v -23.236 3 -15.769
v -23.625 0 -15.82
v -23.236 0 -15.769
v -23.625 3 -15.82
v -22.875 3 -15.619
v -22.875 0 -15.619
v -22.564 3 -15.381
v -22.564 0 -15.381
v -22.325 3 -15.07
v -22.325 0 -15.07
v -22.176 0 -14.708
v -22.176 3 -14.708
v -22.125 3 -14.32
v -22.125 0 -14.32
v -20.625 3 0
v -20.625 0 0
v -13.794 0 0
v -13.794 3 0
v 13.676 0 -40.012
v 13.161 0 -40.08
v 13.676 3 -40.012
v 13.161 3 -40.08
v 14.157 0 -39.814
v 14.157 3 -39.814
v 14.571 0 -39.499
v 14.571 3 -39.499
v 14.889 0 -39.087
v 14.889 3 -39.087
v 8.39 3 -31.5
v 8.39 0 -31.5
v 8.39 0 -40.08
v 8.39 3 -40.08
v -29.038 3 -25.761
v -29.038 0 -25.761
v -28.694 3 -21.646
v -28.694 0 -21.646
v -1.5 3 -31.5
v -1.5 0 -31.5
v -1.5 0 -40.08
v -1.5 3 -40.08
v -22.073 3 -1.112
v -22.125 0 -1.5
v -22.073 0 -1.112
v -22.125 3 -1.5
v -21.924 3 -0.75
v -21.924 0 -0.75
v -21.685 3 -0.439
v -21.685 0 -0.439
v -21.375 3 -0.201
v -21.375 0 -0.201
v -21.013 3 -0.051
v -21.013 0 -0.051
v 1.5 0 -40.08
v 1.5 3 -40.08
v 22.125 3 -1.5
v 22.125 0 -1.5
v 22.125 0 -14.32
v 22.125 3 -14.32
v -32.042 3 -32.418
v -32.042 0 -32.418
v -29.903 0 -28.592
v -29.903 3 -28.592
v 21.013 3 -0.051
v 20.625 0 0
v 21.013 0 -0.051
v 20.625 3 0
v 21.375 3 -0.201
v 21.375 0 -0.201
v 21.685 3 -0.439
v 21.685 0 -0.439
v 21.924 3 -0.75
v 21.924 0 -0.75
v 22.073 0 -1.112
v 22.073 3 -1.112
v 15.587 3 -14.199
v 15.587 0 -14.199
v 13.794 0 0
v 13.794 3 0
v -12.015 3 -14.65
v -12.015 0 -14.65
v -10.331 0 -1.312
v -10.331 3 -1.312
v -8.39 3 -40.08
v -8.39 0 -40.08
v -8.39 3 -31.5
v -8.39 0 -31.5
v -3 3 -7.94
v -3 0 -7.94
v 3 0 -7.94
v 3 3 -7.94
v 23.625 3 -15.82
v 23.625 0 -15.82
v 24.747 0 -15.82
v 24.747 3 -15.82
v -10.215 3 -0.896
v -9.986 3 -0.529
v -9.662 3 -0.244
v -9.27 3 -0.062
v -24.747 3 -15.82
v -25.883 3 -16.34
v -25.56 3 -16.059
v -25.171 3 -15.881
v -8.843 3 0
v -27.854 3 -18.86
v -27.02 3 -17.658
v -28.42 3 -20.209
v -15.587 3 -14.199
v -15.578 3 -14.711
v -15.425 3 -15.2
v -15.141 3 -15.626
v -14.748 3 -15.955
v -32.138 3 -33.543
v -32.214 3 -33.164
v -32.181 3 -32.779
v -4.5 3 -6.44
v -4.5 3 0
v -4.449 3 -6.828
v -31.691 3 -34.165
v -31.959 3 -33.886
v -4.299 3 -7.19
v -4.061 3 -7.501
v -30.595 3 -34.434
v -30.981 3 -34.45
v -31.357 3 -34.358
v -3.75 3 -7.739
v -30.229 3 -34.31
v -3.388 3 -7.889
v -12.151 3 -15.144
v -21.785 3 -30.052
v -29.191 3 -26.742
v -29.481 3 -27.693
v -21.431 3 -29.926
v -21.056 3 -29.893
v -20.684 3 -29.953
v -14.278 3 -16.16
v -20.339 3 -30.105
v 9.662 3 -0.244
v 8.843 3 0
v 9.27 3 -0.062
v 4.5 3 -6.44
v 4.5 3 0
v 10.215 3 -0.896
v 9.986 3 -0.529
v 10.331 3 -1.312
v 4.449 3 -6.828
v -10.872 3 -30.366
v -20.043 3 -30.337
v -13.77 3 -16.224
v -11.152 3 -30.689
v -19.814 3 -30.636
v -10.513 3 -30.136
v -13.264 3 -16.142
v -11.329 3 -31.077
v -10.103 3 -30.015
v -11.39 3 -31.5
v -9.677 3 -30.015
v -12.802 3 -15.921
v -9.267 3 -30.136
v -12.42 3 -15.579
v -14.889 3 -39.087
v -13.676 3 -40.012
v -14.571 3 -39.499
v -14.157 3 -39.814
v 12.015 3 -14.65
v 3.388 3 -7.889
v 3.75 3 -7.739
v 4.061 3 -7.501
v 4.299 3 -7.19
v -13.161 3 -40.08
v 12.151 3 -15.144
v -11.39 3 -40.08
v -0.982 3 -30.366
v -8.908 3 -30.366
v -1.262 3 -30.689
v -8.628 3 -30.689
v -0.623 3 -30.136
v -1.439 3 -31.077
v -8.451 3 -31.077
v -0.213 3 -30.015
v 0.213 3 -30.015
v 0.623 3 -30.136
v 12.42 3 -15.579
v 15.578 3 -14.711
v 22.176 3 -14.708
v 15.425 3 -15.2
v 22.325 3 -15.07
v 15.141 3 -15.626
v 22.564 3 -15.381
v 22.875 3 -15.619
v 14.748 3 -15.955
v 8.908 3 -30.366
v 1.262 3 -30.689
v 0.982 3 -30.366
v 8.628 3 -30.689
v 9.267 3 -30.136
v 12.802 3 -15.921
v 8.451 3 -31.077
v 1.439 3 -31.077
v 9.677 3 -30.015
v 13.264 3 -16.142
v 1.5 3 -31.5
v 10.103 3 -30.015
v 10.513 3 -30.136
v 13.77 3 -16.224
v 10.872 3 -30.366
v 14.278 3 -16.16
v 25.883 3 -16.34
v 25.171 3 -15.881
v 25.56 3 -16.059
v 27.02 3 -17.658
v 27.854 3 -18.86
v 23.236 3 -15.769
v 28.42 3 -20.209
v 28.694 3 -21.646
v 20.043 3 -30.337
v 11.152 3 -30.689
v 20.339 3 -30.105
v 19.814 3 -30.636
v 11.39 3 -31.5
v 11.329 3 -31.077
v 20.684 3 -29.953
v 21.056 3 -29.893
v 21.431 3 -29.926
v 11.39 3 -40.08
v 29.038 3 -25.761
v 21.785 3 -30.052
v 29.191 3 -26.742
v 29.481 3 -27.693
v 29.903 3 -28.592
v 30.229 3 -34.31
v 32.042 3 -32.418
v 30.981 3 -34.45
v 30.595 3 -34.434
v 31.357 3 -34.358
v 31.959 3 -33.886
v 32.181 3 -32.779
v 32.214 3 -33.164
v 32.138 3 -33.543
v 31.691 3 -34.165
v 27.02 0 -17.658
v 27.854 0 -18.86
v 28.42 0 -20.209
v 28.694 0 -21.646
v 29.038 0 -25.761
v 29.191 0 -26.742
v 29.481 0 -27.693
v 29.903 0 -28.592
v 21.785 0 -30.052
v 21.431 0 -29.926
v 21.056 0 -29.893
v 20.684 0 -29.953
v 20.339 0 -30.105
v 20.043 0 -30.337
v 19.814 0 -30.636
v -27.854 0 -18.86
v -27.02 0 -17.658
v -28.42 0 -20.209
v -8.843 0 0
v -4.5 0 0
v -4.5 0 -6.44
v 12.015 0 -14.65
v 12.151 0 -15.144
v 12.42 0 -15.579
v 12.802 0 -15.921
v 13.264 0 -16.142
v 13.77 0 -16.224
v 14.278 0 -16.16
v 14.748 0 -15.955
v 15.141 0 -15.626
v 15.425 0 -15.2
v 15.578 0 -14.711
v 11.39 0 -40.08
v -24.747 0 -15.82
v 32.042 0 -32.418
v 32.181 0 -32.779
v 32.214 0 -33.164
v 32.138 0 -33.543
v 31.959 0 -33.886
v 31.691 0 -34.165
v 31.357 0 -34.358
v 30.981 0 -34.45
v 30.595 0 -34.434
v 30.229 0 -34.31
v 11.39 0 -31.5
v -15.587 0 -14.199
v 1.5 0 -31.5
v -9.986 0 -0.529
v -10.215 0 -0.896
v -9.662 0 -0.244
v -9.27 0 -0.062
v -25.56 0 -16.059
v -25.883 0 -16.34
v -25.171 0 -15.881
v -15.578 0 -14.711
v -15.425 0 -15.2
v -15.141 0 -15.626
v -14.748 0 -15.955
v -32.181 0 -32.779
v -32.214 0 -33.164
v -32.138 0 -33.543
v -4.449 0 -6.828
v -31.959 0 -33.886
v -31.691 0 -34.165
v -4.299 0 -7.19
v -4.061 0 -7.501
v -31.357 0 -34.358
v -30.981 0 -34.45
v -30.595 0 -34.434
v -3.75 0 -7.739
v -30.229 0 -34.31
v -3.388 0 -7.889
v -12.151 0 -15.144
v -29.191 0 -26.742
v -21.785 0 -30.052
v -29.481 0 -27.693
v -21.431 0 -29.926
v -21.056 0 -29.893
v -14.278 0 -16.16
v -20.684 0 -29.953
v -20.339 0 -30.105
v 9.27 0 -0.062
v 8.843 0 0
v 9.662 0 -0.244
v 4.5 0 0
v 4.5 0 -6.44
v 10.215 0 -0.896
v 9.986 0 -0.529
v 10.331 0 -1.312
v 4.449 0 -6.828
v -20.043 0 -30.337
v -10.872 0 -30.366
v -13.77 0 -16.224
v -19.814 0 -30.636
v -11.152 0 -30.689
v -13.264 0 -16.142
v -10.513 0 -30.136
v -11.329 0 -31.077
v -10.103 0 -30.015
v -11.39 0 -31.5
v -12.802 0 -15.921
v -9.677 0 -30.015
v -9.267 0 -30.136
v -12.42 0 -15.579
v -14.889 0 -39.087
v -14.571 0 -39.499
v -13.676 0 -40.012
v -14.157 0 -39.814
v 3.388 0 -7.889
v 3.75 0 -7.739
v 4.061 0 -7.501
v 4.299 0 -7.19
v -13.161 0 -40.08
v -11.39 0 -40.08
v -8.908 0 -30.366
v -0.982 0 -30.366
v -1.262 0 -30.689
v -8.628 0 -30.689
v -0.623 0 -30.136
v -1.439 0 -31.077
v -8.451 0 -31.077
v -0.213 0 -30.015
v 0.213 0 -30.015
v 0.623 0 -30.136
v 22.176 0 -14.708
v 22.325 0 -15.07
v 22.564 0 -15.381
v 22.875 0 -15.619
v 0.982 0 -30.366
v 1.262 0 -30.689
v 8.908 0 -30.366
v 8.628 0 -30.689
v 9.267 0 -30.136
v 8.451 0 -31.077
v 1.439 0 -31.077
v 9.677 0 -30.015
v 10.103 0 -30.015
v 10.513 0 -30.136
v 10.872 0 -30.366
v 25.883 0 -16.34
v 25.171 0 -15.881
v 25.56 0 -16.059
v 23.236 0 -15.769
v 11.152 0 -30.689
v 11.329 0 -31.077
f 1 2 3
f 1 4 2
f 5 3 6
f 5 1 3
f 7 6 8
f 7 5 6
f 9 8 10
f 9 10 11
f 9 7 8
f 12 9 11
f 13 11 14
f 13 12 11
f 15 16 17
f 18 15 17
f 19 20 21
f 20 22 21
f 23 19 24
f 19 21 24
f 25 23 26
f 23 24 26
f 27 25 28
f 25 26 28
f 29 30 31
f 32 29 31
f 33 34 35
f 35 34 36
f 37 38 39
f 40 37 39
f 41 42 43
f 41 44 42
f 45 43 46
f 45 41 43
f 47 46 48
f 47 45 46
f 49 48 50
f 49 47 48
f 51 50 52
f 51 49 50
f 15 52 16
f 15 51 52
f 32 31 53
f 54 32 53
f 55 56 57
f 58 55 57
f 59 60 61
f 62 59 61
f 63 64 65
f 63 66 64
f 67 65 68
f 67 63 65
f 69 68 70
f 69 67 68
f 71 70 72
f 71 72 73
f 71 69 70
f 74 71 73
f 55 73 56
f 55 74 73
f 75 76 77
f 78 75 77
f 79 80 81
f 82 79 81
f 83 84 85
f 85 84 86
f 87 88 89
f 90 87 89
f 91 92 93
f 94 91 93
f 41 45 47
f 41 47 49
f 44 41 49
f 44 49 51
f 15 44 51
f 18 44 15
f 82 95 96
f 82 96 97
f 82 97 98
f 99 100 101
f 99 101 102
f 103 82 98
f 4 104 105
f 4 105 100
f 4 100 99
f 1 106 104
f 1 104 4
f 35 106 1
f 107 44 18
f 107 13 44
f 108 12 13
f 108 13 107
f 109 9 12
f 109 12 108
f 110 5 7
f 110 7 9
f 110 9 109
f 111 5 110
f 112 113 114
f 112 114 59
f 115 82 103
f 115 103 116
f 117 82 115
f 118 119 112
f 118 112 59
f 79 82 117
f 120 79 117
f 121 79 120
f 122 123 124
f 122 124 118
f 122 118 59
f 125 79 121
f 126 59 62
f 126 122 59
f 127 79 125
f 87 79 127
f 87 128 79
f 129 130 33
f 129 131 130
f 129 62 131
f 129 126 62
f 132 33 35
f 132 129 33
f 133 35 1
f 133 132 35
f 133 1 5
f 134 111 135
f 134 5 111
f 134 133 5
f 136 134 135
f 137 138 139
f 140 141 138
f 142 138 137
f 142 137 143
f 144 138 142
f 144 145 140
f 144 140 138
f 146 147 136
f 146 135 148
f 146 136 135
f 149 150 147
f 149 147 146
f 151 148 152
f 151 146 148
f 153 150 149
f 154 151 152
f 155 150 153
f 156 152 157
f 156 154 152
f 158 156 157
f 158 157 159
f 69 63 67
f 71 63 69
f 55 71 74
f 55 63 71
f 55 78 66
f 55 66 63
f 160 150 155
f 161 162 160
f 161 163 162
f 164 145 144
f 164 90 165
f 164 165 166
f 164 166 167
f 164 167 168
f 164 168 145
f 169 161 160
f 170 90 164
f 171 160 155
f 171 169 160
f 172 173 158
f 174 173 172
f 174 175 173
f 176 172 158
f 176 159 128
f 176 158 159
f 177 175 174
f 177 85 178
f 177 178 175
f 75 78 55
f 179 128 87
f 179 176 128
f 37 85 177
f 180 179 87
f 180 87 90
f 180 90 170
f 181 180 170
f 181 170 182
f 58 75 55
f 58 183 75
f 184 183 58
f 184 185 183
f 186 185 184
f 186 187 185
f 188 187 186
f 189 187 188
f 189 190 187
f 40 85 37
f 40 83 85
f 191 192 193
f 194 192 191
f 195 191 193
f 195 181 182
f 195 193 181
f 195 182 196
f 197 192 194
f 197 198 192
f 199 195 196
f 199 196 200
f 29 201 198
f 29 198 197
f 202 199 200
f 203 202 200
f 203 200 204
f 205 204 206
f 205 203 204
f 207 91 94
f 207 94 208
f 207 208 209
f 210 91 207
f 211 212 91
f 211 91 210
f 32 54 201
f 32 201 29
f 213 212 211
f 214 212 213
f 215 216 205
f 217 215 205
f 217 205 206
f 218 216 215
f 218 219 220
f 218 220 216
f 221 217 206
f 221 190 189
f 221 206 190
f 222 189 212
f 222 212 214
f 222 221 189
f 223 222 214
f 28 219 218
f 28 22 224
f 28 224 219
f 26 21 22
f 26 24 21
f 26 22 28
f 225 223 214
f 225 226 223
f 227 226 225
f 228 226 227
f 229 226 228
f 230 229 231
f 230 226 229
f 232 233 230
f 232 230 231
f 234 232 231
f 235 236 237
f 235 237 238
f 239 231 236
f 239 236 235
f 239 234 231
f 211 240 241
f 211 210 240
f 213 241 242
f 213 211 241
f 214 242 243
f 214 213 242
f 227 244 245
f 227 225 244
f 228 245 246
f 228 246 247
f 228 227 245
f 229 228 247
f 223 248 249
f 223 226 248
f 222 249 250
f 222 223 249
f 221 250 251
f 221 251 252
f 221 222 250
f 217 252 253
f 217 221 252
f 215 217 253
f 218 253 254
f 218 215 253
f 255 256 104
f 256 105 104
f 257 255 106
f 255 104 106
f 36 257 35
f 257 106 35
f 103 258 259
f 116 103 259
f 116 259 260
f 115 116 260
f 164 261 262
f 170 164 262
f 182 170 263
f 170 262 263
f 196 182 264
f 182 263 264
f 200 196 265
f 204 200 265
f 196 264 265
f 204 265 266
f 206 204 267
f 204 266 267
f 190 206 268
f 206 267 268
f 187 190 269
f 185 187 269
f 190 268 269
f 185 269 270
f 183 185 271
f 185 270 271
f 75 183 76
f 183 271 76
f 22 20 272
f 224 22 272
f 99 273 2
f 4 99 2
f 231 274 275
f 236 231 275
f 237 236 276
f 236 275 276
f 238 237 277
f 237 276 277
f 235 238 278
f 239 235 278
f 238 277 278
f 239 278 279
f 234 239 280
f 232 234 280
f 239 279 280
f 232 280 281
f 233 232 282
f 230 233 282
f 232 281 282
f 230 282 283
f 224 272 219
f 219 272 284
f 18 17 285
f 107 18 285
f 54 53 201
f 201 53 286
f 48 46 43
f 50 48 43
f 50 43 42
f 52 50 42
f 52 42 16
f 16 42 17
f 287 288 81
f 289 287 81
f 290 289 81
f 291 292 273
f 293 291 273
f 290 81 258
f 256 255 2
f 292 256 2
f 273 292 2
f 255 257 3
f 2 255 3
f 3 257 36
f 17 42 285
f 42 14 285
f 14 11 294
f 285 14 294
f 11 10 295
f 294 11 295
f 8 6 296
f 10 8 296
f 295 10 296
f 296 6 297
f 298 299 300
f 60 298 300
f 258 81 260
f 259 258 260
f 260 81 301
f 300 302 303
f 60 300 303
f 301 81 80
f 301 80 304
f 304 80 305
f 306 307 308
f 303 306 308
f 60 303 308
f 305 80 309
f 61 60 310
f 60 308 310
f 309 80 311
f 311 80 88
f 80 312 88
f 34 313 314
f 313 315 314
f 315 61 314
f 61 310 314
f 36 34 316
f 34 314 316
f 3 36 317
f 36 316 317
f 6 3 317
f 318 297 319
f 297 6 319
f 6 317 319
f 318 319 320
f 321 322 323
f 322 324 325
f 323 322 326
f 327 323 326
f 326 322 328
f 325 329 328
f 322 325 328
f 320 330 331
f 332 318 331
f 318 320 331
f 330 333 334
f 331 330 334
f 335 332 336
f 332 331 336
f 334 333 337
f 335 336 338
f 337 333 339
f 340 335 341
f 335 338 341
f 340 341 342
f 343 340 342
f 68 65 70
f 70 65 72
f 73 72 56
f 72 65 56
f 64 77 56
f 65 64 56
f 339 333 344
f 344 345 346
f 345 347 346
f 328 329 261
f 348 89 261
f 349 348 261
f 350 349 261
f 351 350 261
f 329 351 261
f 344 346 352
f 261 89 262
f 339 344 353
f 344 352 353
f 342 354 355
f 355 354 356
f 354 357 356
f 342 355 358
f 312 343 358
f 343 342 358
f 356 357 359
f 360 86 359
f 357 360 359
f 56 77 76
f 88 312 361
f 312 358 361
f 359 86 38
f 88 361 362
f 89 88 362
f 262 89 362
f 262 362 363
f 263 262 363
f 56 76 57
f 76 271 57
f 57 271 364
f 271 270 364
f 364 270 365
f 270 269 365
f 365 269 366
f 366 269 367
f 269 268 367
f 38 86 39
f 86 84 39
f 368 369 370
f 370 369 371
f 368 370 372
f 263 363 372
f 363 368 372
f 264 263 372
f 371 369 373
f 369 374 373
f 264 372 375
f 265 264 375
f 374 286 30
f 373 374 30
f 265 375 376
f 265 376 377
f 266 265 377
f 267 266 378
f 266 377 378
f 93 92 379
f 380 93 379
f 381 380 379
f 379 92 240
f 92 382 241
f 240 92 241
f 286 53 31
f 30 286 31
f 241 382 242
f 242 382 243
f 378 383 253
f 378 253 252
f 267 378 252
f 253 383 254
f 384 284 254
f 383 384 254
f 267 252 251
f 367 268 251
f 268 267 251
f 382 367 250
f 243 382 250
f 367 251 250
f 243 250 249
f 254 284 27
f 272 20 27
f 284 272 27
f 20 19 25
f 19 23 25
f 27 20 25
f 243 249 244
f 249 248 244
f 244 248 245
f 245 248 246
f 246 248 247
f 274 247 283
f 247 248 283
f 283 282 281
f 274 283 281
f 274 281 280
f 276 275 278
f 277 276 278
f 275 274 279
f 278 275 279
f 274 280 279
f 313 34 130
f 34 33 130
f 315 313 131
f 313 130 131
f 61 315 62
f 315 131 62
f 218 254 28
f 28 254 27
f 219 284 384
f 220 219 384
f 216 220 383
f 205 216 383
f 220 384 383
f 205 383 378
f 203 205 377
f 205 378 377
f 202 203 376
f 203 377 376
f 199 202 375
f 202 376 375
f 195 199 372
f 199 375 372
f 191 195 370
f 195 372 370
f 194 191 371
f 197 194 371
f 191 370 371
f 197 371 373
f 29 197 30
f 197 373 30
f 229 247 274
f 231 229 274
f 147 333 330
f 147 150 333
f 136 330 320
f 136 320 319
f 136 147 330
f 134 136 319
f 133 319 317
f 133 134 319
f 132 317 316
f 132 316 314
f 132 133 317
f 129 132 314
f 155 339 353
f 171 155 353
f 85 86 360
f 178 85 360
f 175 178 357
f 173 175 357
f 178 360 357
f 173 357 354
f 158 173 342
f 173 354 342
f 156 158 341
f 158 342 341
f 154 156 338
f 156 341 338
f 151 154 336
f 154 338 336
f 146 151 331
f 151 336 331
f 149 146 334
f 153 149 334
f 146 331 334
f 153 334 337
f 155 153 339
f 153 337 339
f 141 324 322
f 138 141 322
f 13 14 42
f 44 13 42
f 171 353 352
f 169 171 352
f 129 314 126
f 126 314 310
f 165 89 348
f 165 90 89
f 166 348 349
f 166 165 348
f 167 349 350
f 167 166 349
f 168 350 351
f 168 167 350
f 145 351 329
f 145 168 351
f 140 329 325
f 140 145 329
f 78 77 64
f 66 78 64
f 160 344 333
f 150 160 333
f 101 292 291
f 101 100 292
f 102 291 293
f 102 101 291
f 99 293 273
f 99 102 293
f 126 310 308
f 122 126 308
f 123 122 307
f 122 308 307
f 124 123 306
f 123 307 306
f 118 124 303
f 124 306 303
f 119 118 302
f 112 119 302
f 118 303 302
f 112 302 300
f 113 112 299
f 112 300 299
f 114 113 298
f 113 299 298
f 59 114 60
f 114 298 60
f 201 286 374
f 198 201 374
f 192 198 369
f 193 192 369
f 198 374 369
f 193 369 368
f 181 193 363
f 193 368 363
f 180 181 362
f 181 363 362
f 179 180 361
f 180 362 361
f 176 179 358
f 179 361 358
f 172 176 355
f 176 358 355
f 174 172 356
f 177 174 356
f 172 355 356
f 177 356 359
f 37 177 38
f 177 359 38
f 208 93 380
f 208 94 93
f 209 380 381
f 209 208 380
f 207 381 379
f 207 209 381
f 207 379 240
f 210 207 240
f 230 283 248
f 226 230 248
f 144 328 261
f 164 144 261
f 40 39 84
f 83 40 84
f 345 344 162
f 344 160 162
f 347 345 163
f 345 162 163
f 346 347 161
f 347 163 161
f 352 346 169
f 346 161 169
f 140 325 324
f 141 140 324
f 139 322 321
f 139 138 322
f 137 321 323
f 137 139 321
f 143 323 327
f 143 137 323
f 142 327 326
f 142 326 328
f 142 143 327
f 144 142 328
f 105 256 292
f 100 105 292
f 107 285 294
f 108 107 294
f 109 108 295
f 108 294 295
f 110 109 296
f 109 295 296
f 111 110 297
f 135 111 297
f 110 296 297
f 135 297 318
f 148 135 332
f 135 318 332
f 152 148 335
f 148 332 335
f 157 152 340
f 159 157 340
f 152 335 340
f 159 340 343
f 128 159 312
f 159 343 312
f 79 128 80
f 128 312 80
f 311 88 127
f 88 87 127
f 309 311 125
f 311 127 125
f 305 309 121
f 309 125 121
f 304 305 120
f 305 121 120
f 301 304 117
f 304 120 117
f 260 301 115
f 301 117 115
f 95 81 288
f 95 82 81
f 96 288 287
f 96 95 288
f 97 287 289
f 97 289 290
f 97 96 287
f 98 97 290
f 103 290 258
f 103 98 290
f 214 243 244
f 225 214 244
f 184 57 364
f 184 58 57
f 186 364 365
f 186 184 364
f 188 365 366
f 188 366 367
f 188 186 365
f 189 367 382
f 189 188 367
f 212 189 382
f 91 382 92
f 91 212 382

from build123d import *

# Parameters (mm, degrees)
BOSS_EXTRUDE1_DEPTH = 3
FILLET1_R           = 1.5
FILLET2_R           = 7
FILLET3_R           = 2


with BuildPart() as part:
    # Sketch1 → Boss-Extrude1 (new body)
    with BuildSketch(Plane(origin=(0, 0, 0), x_dir=(1, 0, 0), z_dir=(0, 1, 0))):
        with BuildLine():
            Line((-4.5, 7.94), (4.5, 7.94))
            Line((4.5, 7.94), (4.5, 0))
            Line((4.5, 0), (10.165, 0))
            Line((10.165, 0), (12.015, 14.649700441))
            ThreePointArc((12.015, 14.649700441), (14.026334206, 16.21), (15.586633764, 14.198665794))
            Line((15.586633764, 14.198665794), (13.793591523, 0))
            Line((13.793591523, 0), (22.124537234, 0))
            Line((22.124537234, 0), (22.124537234, 15.82))
            Line((22.124537234, 15.82), (25.434537234, 15.82))
            Line((25.434537234, 15.82), (28.504537234, 19.38))
            Line((28.504537234, 19.38), (29.164537234, 27.27))
            Line((29.164537234, 27.27), (32.041780145, 32.418380087))
            ThreePointArc((32.041780145, 32.418380087), (31.835, 34.03463387), (30.229008776, 34.31))
            Line((30.229008776, 34.31), (20.525, 29.416544335))
            Line((20.525, 29.416544335), (14.31, 40.08))
            Line((14.31, 40.08), (11.39, 40.08))
            Line((11.39, 40.08), (11.39, 31.5))
            ThreePointArc((11.39, 31.5), (9.89, 30), (8.39, 31.5))
            Line((8.39, 31.5), (8.39, 40.08))
            Line((8.39, 40.08), (1.5, 40.08))
            Line((1.5, 40.08), (1.5, 31.5))
            ThreePointArc((1.5, 31.5), (0, 30), (-1.5, 31.5))
            Line((-1.5, 31.5), (-1.5, 40.08))
            Line((-1.5, 40.08), (-8.39, 40.08))
            Line((-8.39, 40.08), (-8.39, 31.5))
            ThreePointArc((-8.39, 31.5), (-9.89, 30), (-11.39, 31.5))
            Line((-11.39, 31.5), (-11.39, 40.08))
            Line((-11.39, 40.08), (-14.31, 40.08))
            Line((-14.31, 40.08), (-20.525, 29.416544335))
            Line((-20.525, 29.416544335), (-30.229008776, 34.31))
            ThreePointArc((-30.229008776, 34.31), (-31.835, 34.03463387), (-32.041780145, 32.418380087))
            Line((-32.041780145, 32.418380087), (-29.164537234, 27.27))
            Line((-29.164537234, 27.27), (-28.504537234, 19.38))
            Line((-28.504537234, 19.38), (-25.434537234, 15.82))
            Line((-25.434537234, 15.82), (-22.124537234, 15.82))
            Line((-22.124537234, 15.82), (-22.124537234, 0))
            Line((-22.124537234, 0), (-13.793591523, 0))
            Line((-13.793591523, 0), (-15.586633764, 14.198665794))
            ThreePointArc((-15.586633764, 14.198665794), (-14.026334206, 16.21), (-12.015, 14.649700441))
            Line((-12.015, 14.649700441), (-10.165, 0))
            Line((-10.165, 0), (-4.5, 0))
            Line((-4.5, 0), (-4.5, 7.94))
        make_face()
    extrude(amount=BOSS_EXTRUDE1_DEPTH)

    # Fillet1
    fillet1_edges = [part.edges().sort_by_distance(p)[0] for p in [
        (4.5, 1.5, -7.94),
        (-4.5, 1.5, -7.94),
        (-10.165, 1.5, 0),
        (-22.124537234, 1.5, 0),
        (-22.124537234, 1.5, -15.82),
        (-25.434537234, 1.5, -15.82),
        (-20.525, 1.5, -29.416544335),
        (20.525, 1.5, -29.416544335),
        (25.434537234, 1.5, -15.82),
        (22.124537234, 1.5, -15.82),
        (22.124537234, 1.5, 0),
        (10.165, 1.5, 0),
    ]]
    fillet(fillet1_edges, radius=FILLET1_R)

    # Fillet2
    fillet2_edges = [part.edges().sort_by_distance(p)[0] for p in [
        (-28.504537234, 1.5, -19.38),
        (-29.164537234, 1.5, -27.27),
        (29.164537234, 1.5, -27.27),
        (28.504537234, 1.5, -19.38),
    ]]
    fillet(fillet2_edges, radius=FILLET2_R)

    # Fillet3
    fillet3_edges = [part.edges().sort_by_distance(p)[0] for p in [
        (-14.31, 1.5, -40.08),
        (14.31, 1.5, -40.08),
    ]]
    fillet(fillet3_edges, radius=FILLET3_R)


solid = part.part
